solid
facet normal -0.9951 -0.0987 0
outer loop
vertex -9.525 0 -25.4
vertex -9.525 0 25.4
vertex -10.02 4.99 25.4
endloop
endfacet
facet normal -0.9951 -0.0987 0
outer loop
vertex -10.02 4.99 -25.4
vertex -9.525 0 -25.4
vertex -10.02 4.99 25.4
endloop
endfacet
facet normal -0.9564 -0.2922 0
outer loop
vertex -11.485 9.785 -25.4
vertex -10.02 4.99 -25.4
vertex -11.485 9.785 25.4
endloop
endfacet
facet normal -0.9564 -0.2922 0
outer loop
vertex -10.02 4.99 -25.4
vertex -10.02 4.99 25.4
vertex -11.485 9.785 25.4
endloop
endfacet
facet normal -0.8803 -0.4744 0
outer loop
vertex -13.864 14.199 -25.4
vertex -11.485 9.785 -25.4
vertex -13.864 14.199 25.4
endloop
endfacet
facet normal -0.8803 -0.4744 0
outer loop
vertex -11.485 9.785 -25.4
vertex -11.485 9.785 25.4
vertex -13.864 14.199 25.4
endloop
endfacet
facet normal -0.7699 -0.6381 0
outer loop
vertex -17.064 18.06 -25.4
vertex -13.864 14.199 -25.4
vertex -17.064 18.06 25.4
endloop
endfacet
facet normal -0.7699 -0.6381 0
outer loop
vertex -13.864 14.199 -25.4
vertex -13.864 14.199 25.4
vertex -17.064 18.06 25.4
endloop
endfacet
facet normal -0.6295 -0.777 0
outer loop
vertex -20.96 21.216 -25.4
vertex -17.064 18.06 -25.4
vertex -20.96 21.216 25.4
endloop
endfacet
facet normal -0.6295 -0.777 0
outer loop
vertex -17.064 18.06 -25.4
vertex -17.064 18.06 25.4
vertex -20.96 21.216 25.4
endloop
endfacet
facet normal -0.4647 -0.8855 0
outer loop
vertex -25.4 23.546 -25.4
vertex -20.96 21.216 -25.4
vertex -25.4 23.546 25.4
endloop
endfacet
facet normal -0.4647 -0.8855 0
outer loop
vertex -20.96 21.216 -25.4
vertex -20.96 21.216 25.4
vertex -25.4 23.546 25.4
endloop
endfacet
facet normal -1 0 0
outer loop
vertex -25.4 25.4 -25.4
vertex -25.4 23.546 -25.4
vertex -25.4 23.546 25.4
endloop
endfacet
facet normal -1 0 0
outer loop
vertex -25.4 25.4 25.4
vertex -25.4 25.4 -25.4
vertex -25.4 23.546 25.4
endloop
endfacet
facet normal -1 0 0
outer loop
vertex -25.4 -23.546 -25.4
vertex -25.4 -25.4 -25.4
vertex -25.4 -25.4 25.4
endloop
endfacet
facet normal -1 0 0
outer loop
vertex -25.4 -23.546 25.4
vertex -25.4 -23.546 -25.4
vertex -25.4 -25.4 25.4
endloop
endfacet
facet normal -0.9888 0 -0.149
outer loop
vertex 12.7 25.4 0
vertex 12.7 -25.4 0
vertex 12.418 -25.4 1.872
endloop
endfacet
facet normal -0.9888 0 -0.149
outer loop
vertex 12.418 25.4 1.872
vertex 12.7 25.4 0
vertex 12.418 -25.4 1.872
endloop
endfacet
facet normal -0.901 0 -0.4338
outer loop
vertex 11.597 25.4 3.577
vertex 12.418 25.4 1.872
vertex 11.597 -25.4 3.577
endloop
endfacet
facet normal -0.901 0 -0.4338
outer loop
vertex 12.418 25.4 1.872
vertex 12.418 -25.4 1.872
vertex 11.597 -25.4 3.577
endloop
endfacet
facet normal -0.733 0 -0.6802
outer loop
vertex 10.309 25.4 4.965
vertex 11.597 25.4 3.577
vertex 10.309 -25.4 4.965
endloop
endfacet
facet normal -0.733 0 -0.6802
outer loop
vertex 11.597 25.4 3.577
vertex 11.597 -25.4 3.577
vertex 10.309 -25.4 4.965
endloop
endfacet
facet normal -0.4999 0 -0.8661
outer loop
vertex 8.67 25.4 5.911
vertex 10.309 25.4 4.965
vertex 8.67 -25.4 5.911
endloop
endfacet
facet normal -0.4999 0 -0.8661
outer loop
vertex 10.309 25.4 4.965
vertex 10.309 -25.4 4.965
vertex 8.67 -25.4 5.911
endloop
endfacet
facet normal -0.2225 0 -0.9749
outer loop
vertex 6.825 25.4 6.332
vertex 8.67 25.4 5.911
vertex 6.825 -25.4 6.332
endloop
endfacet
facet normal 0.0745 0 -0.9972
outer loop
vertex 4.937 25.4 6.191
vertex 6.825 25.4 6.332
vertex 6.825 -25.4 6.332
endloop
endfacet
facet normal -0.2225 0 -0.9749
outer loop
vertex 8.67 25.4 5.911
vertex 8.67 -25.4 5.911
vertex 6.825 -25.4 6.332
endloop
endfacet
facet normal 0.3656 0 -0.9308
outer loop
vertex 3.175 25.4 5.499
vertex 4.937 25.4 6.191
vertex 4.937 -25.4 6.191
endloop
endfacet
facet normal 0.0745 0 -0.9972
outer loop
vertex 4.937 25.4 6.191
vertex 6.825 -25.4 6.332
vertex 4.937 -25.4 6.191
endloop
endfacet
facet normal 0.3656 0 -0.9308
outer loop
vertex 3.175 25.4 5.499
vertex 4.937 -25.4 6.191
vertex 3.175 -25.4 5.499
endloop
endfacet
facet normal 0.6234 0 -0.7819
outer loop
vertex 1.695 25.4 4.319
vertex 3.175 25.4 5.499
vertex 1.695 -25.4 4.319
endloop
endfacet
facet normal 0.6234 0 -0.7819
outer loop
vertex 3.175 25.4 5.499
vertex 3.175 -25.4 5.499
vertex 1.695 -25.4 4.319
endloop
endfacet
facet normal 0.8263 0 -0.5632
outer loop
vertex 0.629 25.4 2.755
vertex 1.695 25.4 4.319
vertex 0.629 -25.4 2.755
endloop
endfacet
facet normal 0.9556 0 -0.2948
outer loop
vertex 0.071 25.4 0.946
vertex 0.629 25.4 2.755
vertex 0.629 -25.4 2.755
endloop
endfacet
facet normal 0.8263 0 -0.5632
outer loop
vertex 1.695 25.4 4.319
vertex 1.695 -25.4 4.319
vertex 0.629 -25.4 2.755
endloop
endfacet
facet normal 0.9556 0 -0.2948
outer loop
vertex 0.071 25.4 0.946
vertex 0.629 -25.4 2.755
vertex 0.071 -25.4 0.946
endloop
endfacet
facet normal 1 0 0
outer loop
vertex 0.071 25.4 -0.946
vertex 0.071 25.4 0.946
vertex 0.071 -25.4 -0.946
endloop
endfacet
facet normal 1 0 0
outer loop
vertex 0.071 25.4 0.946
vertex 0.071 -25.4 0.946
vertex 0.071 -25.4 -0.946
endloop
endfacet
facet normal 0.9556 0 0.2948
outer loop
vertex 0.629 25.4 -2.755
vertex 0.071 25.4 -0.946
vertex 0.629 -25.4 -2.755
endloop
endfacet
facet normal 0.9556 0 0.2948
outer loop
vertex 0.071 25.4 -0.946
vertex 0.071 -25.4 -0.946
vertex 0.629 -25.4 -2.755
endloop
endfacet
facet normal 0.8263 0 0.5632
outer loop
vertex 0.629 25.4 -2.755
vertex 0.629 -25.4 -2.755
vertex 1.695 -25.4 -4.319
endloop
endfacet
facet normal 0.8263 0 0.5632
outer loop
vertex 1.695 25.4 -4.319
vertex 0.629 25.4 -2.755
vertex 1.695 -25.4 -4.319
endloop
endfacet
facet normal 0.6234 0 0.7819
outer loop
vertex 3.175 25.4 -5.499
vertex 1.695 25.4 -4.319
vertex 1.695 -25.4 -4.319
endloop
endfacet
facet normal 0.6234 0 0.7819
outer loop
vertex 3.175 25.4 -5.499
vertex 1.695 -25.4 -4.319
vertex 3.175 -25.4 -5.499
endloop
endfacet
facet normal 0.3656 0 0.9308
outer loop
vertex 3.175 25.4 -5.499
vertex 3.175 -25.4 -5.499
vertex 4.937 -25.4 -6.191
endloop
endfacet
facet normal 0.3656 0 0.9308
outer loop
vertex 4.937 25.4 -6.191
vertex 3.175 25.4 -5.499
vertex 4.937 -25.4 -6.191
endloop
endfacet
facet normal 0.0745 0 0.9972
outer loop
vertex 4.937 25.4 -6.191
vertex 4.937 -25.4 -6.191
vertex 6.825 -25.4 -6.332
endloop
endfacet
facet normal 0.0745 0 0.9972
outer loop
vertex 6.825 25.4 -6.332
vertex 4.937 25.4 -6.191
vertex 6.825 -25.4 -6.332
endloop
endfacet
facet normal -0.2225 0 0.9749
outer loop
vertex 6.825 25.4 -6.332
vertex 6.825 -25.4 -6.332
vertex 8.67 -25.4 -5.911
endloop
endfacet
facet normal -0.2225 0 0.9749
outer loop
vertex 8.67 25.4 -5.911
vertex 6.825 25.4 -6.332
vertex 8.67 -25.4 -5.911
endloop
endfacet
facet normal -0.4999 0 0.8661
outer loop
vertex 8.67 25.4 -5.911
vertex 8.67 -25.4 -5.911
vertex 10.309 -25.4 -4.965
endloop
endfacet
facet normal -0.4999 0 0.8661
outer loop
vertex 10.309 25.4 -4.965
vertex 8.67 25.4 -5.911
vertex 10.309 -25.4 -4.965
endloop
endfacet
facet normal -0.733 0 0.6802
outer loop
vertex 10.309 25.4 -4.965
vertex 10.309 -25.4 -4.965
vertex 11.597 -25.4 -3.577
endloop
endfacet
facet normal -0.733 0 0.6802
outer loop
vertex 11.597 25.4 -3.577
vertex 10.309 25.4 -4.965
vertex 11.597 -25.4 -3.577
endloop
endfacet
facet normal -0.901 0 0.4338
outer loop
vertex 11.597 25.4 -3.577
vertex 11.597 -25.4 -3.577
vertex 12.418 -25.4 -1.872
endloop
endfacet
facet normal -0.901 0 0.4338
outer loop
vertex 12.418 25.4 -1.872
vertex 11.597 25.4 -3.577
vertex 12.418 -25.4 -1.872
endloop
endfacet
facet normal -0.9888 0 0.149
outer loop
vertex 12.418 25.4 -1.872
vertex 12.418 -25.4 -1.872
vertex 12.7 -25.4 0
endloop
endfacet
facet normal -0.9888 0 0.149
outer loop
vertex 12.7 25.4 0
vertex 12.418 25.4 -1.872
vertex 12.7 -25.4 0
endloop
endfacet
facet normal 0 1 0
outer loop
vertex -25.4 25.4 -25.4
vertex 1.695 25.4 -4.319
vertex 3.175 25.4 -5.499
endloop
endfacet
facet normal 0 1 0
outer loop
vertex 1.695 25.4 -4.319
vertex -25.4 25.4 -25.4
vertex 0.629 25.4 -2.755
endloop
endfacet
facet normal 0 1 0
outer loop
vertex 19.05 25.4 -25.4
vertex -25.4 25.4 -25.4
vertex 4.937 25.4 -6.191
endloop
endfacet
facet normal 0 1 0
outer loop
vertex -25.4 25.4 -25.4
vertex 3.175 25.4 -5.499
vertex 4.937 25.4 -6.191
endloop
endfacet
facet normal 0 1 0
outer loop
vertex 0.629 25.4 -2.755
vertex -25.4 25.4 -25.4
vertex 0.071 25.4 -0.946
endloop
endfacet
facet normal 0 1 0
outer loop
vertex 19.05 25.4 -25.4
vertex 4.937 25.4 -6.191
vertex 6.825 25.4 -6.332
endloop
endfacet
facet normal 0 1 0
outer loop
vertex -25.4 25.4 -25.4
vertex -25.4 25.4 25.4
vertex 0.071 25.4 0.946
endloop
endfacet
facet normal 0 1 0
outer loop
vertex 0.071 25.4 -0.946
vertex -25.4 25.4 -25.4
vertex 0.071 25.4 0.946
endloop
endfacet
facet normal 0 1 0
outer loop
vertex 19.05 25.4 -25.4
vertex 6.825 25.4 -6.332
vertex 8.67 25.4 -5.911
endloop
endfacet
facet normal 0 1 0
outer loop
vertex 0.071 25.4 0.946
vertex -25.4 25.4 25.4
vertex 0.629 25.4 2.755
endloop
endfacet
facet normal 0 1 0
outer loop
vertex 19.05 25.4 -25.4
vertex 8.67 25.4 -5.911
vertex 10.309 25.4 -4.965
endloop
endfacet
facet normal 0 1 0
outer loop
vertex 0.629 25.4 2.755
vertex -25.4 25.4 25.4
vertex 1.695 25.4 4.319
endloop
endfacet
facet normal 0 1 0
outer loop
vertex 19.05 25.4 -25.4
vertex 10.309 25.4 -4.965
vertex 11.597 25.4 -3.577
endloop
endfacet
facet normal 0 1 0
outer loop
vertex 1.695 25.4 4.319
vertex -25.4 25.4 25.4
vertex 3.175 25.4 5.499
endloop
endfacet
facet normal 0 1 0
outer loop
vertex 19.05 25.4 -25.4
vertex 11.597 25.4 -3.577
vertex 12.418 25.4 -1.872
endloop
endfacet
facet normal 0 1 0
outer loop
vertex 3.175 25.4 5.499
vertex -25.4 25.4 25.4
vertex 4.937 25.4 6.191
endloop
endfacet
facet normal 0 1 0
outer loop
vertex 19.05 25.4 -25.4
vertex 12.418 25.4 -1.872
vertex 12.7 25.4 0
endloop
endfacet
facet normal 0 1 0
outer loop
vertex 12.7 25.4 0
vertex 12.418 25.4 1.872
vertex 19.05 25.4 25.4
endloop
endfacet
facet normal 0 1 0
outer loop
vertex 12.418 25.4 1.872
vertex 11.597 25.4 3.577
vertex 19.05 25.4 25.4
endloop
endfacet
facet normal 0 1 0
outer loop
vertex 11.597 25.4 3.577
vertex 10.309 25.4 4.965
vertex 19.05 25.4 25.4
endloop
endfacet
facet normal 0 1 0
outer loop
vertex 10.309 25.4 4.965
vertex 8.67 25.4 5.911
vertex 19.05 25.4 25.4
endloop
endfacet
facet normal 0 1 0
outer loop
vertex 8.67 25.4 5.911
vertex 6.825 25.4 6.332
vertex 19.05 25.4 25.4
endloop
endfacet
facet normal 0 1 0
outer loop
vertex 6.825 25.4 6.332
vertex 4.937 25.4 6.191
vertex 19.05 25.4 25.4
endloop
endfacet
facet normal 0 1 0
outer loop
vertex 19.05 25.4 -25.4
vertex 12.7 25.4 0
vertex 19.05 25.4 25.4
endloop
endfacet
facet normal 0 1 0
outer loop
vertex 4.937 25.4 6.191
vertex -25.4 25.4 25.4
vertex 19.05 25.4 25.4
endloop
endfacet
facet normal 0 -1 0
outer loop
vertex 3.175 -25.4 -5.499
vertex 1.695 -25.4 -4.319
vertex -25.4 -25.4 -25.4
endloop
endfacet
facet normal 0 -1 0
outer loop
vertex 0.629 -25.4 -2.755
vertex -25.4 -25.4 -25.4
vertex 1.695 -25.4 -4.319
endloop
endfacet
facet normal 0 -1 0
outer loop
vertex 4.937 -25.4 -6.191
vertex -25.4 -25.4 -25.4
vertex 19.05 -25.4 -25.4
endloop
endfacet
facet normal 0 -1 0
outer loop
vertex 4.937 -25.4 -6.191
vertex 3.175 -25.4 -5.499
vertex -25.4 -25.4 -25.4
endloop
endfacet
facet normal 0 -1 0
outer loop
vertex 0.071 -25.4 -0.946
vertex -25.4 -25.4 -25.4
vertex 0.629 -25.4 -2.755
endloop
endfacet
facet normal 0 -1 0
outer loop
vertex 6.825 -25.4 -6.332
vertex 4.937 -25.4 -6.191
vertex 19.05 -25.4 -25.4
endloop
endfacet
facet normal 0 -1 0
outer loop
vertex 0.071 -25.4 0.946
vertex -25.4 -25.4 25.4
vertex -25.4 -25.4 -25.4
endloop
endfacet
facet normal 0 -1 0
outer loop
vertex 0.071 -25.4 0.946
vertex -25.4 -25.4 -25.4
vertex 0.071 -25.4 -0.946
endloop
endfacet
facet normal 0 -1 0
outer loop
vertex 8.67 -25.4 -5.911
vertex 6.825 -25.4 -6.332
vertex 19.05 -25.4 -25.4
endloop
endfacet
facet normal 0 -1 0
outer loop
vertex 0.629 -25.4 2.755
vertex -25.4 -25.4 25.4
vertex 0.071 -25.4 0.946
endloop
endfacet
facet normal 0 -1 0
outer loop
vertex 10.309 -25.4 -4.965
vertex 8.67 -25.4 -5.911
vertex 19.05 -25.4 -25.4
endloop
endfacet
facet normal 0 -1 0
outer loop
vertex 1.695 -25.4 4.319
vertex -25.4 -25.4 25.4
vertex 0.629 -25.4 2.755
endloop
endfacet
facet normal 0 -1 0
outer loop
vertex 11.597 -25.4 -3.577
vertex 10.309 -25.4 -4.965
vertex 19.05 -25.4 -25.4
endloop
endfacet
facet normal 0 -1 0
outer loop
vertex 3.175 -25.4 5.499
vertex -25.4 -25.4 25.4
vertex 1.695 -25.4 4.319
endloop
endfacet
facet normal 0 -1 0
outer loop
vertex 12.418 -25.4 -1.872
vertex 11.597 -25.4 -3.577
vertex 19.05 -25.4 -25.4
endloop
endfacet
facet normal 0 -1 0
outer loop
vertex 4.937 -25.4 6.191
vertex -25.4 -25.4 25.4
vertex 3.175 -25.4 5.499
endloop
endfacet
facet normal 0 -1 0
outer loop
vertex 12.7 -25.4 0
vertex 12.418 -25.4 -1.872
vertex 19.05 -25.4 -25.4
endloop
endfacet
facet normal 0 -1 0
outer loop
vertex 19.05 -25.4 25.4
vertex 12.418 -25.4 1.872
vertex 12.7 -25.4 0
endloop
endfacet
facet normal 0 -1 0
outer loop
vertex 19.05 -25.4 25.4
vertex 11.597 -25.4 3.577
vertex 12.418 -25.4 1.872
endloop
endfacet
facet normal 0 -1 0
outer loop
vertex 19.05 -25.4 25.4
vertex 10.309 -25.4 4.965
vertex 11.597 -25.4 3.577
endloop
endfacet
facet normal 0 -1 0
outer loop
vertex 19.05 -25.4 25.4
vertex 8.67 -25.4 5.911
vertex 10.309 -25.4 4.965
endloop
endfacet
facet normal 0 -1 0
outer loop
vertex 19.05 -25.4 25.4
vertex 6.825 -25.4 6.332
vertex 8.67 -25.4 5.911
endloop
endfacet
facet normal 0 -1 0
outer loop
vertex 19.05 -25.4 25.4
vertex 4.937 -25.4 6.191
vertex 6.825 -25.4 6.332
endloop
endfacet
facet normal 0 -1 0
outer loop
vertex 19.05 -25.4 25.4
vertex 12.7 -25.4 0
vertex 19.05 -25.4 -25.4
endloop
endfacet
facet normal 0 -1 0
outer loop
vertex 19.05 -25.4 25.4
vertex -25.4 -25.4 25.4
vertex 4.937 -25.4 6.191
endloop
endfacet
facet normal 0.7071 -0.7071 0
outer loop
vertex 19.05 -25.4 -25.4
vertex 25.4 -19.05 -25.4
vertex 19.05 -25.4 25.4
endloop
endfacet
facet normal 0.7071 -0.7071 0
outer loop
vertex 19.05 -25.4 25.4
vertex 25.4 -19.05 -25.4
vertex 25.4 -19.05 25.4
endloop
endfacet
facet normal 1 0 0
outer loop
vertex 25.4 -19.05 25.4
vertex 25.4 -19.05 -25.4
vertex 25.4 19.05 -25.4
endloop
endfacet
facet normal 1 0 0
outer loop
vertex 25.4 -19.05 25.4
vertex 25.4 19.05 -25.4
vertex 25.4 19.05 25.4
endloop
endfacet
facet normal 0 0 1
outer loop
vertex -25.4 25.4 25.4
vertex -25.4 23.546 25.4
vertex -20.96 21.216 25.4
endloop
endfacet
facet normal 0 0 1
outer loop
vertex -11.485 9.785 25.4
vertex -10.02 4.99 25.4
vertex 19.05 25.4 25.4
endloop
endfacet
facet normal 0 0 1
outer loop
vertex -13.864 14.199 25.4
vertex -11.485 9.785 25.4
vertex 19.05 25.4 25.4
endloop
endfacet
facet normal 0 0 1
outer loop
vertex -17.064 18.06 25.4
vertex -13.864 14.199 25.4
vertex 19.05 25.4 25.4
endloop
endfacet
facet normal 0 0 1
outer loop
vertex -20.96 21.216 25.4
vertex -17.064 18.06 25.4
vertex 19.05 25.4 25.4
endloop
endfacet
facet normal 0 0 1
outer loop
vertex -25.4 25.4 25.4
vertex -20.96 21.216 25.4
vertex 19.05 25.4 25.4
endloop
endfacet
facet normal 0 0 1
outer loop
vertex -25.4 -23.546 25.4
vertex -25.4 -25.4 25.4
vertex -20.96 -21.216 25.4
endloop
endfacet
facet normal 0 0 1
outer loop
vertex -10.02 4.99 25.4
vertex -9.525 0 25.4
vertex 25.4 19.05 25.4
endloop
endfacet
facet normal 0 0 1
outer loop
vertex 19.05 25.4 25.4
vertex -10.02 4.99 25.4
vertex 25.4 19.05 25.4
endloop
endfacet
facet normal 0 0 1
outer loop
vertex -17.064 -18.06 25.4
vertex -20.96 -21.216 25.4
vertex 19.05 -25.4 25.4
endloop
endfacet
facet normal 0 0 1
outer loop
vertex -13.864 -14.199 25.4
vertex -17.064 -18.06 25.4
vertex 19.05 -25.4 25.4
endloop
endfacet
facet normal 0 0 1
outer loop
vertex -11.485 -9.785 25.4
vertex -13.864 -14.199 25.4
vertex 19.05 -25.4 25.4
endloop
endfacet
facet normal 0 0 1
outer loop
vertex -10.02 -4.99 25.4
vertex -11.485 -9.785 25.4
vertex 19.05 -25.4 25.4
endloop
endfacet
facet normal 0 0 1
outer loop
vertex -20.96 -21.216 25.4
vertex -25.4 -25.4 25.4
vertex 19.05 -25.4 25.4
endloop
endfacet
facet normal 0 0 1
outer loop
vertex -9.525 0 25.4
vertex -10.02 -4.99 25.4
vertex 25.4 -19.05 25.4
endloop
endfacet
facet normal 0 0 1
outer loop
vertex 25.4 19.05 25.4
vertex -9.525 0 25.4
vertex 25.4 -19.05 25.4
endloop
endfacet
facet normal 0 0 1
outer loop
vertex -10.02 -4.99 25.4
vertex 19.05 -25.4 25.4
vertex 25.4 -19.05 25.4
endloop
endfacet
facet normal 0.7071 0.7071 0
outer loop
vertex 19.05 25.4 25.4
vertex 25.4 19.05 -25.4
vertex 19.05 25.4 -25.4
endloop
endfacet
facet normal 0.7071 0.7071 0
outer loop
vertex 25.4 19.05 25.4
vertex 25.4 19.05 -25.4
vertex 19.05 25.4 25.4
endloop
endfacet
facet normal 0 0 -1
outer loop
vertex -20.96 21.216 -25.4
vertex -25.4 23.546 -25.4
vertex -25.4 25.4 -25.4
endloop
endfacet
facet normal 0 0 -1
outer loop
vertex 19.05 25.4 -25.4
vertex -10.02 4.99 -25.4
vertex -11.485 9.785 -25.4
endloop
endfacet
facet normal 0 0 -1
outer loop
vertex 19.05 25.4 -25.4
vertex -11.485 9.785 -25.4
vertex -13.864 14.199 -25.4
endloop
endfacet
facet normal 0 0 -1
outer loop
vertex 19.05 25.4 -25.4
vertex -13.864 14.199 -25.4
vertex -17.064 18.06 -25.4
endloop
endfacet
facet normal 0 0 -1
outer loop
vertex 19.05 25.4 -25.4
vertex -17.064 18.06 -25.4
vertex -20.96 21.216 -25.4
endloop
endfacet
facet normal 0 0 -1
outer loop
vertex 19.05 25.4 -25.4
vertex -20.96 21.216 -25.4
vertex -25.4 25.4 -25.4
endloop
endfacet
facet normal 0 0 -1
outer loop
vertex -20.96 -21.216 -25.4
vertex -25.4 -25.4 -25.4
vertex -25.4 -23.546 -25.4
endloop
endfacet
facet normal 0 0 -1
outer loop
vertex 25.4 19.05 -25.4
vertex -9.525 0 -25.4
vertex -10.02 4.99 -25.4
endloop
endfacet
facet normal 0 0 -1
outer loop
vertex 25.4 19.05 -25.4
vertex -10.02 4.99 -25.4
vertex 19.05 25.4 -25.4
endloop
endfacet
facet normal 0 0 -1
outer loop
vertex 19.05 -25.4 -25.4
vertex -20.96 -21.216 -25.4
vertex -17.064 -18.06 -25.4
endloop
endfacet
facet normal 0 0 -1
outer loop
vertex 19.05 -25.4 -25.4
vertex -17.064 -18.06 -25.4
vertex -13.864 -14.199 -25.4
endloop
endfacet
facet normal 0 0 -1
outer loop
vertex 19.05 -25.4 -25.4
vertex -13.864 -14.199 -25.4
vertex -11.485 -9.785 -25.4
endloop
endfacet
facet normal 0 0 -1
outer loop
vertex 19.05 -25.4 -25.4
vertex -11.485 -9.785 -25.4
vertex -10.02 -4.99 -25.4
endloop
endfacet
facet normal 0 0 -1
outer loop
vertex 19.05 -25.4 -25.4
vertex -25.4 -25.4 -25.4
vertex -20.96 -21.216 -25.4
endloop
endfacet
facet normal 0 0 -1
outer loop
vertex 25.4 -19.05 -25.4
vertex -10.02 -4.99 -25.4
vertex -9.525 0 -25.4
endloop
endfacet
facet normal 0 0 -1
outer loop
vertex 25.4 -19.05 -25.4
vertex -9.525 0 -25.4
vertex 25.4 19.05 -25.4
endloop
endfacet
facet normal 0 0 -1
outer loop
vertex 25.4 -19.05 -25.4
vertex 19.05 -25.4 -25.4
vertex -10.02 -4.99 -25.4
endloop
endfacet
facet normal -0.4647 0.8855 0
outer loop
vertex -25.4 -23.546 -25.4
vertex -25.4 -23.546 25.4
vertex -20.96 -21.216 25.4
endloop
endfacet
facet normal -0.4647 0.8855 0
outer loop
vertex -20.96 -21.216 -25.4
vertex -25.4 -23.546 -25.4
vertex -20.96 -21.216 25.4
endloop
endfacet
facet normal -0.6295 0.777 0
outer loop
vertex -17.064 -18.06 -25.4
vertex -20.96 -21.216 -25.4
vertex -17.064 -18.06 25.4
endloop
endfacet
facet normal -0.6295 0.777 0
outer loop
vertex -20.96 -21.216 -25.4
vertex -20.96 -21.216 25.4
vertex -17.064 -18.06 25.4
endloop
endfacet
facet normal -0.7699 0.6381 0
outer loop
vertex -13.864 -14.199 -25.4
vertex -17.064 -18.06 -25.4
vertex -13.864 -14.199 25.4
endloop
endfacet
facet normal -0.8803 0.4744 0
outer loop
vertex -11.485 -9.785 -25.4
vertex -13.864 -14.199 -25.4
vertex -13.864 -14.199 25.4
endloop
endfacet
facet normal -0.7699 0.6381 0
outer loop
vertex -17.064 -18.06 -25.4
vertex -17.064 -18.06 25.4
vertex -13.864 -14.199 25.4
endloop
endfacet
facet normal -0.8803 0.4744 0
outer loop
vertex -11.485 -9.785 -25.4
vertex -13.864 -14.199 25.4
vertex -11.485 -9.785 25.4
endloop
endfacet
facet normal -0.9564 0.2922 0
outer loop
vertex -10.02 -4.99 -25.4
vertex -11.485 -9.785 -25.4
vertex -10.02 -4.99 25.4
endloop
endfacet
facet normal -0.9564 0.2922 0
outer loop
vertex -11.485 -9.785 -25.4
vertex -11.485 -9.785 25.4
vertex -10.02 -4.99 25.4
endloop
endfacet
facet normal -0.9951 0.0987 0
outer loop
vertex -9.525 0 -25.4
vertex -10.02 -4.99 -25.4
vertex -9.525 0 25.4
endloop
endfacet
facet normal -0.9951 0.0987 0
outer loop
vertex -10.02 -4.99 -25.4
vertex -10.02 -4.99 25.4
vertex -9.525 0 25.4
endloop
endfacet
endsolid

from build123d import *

# Parameters (mm, degrees)
F0_W     = 50.8
F0_H     = 50.8
F1_DEPTH = 25.4
F3_DEPTH = 50.8
F4_SIZE  = 6.35
F5_R     = 6.35
F6_DEPTH = 50.801


with BuildPart() as f1:
    # F0 (on Front) → F1 (new body, symmetric)
    with BuildSketch(Plane.XZ):
        Rectangle(F0_W, F0_H)
    extrude(amount=F1_DEPTH, both=True)

    # F2 (on face) → F3 (cut)
    with BuildSketch(Plane.XY.offset(25.4)):
        with BuildLine():
            ThreePointArc((-25.4, -23.5464301965), (-13.8644325812, -14.1990316571), (-9.525, 0))
            ThreePointArc((-9.525, 0), (-13.8644325812, 14.1990316571), (-25.4, 23.5464301965))
            Line((-25.4, 23.5464301965), (-25.4, -23.5464301965))
        make_face()
    extrude(amount=-F3_DEPTH, mode=Mode.SUBTRACT)

    # F4
    f4_edges = [f1.edges().sort_by_distance(p)[0] for p in [
        (25.4, -25.4, 0),
        (25.4, 25.4, 0),
    ]]
    chamfer(f4_edges, length=F4_SIZE)

    # F5 (on face) → F6 (cut, through all)
    with BuildSketch(Plane.XZ.offset(25.4)):
        with Locations((6.35, 0)):
            Circle(F5_R)
    extrude(amount=-F6_DEPTH, mode=Mode.SUBTRACT)


solid = f1.part
